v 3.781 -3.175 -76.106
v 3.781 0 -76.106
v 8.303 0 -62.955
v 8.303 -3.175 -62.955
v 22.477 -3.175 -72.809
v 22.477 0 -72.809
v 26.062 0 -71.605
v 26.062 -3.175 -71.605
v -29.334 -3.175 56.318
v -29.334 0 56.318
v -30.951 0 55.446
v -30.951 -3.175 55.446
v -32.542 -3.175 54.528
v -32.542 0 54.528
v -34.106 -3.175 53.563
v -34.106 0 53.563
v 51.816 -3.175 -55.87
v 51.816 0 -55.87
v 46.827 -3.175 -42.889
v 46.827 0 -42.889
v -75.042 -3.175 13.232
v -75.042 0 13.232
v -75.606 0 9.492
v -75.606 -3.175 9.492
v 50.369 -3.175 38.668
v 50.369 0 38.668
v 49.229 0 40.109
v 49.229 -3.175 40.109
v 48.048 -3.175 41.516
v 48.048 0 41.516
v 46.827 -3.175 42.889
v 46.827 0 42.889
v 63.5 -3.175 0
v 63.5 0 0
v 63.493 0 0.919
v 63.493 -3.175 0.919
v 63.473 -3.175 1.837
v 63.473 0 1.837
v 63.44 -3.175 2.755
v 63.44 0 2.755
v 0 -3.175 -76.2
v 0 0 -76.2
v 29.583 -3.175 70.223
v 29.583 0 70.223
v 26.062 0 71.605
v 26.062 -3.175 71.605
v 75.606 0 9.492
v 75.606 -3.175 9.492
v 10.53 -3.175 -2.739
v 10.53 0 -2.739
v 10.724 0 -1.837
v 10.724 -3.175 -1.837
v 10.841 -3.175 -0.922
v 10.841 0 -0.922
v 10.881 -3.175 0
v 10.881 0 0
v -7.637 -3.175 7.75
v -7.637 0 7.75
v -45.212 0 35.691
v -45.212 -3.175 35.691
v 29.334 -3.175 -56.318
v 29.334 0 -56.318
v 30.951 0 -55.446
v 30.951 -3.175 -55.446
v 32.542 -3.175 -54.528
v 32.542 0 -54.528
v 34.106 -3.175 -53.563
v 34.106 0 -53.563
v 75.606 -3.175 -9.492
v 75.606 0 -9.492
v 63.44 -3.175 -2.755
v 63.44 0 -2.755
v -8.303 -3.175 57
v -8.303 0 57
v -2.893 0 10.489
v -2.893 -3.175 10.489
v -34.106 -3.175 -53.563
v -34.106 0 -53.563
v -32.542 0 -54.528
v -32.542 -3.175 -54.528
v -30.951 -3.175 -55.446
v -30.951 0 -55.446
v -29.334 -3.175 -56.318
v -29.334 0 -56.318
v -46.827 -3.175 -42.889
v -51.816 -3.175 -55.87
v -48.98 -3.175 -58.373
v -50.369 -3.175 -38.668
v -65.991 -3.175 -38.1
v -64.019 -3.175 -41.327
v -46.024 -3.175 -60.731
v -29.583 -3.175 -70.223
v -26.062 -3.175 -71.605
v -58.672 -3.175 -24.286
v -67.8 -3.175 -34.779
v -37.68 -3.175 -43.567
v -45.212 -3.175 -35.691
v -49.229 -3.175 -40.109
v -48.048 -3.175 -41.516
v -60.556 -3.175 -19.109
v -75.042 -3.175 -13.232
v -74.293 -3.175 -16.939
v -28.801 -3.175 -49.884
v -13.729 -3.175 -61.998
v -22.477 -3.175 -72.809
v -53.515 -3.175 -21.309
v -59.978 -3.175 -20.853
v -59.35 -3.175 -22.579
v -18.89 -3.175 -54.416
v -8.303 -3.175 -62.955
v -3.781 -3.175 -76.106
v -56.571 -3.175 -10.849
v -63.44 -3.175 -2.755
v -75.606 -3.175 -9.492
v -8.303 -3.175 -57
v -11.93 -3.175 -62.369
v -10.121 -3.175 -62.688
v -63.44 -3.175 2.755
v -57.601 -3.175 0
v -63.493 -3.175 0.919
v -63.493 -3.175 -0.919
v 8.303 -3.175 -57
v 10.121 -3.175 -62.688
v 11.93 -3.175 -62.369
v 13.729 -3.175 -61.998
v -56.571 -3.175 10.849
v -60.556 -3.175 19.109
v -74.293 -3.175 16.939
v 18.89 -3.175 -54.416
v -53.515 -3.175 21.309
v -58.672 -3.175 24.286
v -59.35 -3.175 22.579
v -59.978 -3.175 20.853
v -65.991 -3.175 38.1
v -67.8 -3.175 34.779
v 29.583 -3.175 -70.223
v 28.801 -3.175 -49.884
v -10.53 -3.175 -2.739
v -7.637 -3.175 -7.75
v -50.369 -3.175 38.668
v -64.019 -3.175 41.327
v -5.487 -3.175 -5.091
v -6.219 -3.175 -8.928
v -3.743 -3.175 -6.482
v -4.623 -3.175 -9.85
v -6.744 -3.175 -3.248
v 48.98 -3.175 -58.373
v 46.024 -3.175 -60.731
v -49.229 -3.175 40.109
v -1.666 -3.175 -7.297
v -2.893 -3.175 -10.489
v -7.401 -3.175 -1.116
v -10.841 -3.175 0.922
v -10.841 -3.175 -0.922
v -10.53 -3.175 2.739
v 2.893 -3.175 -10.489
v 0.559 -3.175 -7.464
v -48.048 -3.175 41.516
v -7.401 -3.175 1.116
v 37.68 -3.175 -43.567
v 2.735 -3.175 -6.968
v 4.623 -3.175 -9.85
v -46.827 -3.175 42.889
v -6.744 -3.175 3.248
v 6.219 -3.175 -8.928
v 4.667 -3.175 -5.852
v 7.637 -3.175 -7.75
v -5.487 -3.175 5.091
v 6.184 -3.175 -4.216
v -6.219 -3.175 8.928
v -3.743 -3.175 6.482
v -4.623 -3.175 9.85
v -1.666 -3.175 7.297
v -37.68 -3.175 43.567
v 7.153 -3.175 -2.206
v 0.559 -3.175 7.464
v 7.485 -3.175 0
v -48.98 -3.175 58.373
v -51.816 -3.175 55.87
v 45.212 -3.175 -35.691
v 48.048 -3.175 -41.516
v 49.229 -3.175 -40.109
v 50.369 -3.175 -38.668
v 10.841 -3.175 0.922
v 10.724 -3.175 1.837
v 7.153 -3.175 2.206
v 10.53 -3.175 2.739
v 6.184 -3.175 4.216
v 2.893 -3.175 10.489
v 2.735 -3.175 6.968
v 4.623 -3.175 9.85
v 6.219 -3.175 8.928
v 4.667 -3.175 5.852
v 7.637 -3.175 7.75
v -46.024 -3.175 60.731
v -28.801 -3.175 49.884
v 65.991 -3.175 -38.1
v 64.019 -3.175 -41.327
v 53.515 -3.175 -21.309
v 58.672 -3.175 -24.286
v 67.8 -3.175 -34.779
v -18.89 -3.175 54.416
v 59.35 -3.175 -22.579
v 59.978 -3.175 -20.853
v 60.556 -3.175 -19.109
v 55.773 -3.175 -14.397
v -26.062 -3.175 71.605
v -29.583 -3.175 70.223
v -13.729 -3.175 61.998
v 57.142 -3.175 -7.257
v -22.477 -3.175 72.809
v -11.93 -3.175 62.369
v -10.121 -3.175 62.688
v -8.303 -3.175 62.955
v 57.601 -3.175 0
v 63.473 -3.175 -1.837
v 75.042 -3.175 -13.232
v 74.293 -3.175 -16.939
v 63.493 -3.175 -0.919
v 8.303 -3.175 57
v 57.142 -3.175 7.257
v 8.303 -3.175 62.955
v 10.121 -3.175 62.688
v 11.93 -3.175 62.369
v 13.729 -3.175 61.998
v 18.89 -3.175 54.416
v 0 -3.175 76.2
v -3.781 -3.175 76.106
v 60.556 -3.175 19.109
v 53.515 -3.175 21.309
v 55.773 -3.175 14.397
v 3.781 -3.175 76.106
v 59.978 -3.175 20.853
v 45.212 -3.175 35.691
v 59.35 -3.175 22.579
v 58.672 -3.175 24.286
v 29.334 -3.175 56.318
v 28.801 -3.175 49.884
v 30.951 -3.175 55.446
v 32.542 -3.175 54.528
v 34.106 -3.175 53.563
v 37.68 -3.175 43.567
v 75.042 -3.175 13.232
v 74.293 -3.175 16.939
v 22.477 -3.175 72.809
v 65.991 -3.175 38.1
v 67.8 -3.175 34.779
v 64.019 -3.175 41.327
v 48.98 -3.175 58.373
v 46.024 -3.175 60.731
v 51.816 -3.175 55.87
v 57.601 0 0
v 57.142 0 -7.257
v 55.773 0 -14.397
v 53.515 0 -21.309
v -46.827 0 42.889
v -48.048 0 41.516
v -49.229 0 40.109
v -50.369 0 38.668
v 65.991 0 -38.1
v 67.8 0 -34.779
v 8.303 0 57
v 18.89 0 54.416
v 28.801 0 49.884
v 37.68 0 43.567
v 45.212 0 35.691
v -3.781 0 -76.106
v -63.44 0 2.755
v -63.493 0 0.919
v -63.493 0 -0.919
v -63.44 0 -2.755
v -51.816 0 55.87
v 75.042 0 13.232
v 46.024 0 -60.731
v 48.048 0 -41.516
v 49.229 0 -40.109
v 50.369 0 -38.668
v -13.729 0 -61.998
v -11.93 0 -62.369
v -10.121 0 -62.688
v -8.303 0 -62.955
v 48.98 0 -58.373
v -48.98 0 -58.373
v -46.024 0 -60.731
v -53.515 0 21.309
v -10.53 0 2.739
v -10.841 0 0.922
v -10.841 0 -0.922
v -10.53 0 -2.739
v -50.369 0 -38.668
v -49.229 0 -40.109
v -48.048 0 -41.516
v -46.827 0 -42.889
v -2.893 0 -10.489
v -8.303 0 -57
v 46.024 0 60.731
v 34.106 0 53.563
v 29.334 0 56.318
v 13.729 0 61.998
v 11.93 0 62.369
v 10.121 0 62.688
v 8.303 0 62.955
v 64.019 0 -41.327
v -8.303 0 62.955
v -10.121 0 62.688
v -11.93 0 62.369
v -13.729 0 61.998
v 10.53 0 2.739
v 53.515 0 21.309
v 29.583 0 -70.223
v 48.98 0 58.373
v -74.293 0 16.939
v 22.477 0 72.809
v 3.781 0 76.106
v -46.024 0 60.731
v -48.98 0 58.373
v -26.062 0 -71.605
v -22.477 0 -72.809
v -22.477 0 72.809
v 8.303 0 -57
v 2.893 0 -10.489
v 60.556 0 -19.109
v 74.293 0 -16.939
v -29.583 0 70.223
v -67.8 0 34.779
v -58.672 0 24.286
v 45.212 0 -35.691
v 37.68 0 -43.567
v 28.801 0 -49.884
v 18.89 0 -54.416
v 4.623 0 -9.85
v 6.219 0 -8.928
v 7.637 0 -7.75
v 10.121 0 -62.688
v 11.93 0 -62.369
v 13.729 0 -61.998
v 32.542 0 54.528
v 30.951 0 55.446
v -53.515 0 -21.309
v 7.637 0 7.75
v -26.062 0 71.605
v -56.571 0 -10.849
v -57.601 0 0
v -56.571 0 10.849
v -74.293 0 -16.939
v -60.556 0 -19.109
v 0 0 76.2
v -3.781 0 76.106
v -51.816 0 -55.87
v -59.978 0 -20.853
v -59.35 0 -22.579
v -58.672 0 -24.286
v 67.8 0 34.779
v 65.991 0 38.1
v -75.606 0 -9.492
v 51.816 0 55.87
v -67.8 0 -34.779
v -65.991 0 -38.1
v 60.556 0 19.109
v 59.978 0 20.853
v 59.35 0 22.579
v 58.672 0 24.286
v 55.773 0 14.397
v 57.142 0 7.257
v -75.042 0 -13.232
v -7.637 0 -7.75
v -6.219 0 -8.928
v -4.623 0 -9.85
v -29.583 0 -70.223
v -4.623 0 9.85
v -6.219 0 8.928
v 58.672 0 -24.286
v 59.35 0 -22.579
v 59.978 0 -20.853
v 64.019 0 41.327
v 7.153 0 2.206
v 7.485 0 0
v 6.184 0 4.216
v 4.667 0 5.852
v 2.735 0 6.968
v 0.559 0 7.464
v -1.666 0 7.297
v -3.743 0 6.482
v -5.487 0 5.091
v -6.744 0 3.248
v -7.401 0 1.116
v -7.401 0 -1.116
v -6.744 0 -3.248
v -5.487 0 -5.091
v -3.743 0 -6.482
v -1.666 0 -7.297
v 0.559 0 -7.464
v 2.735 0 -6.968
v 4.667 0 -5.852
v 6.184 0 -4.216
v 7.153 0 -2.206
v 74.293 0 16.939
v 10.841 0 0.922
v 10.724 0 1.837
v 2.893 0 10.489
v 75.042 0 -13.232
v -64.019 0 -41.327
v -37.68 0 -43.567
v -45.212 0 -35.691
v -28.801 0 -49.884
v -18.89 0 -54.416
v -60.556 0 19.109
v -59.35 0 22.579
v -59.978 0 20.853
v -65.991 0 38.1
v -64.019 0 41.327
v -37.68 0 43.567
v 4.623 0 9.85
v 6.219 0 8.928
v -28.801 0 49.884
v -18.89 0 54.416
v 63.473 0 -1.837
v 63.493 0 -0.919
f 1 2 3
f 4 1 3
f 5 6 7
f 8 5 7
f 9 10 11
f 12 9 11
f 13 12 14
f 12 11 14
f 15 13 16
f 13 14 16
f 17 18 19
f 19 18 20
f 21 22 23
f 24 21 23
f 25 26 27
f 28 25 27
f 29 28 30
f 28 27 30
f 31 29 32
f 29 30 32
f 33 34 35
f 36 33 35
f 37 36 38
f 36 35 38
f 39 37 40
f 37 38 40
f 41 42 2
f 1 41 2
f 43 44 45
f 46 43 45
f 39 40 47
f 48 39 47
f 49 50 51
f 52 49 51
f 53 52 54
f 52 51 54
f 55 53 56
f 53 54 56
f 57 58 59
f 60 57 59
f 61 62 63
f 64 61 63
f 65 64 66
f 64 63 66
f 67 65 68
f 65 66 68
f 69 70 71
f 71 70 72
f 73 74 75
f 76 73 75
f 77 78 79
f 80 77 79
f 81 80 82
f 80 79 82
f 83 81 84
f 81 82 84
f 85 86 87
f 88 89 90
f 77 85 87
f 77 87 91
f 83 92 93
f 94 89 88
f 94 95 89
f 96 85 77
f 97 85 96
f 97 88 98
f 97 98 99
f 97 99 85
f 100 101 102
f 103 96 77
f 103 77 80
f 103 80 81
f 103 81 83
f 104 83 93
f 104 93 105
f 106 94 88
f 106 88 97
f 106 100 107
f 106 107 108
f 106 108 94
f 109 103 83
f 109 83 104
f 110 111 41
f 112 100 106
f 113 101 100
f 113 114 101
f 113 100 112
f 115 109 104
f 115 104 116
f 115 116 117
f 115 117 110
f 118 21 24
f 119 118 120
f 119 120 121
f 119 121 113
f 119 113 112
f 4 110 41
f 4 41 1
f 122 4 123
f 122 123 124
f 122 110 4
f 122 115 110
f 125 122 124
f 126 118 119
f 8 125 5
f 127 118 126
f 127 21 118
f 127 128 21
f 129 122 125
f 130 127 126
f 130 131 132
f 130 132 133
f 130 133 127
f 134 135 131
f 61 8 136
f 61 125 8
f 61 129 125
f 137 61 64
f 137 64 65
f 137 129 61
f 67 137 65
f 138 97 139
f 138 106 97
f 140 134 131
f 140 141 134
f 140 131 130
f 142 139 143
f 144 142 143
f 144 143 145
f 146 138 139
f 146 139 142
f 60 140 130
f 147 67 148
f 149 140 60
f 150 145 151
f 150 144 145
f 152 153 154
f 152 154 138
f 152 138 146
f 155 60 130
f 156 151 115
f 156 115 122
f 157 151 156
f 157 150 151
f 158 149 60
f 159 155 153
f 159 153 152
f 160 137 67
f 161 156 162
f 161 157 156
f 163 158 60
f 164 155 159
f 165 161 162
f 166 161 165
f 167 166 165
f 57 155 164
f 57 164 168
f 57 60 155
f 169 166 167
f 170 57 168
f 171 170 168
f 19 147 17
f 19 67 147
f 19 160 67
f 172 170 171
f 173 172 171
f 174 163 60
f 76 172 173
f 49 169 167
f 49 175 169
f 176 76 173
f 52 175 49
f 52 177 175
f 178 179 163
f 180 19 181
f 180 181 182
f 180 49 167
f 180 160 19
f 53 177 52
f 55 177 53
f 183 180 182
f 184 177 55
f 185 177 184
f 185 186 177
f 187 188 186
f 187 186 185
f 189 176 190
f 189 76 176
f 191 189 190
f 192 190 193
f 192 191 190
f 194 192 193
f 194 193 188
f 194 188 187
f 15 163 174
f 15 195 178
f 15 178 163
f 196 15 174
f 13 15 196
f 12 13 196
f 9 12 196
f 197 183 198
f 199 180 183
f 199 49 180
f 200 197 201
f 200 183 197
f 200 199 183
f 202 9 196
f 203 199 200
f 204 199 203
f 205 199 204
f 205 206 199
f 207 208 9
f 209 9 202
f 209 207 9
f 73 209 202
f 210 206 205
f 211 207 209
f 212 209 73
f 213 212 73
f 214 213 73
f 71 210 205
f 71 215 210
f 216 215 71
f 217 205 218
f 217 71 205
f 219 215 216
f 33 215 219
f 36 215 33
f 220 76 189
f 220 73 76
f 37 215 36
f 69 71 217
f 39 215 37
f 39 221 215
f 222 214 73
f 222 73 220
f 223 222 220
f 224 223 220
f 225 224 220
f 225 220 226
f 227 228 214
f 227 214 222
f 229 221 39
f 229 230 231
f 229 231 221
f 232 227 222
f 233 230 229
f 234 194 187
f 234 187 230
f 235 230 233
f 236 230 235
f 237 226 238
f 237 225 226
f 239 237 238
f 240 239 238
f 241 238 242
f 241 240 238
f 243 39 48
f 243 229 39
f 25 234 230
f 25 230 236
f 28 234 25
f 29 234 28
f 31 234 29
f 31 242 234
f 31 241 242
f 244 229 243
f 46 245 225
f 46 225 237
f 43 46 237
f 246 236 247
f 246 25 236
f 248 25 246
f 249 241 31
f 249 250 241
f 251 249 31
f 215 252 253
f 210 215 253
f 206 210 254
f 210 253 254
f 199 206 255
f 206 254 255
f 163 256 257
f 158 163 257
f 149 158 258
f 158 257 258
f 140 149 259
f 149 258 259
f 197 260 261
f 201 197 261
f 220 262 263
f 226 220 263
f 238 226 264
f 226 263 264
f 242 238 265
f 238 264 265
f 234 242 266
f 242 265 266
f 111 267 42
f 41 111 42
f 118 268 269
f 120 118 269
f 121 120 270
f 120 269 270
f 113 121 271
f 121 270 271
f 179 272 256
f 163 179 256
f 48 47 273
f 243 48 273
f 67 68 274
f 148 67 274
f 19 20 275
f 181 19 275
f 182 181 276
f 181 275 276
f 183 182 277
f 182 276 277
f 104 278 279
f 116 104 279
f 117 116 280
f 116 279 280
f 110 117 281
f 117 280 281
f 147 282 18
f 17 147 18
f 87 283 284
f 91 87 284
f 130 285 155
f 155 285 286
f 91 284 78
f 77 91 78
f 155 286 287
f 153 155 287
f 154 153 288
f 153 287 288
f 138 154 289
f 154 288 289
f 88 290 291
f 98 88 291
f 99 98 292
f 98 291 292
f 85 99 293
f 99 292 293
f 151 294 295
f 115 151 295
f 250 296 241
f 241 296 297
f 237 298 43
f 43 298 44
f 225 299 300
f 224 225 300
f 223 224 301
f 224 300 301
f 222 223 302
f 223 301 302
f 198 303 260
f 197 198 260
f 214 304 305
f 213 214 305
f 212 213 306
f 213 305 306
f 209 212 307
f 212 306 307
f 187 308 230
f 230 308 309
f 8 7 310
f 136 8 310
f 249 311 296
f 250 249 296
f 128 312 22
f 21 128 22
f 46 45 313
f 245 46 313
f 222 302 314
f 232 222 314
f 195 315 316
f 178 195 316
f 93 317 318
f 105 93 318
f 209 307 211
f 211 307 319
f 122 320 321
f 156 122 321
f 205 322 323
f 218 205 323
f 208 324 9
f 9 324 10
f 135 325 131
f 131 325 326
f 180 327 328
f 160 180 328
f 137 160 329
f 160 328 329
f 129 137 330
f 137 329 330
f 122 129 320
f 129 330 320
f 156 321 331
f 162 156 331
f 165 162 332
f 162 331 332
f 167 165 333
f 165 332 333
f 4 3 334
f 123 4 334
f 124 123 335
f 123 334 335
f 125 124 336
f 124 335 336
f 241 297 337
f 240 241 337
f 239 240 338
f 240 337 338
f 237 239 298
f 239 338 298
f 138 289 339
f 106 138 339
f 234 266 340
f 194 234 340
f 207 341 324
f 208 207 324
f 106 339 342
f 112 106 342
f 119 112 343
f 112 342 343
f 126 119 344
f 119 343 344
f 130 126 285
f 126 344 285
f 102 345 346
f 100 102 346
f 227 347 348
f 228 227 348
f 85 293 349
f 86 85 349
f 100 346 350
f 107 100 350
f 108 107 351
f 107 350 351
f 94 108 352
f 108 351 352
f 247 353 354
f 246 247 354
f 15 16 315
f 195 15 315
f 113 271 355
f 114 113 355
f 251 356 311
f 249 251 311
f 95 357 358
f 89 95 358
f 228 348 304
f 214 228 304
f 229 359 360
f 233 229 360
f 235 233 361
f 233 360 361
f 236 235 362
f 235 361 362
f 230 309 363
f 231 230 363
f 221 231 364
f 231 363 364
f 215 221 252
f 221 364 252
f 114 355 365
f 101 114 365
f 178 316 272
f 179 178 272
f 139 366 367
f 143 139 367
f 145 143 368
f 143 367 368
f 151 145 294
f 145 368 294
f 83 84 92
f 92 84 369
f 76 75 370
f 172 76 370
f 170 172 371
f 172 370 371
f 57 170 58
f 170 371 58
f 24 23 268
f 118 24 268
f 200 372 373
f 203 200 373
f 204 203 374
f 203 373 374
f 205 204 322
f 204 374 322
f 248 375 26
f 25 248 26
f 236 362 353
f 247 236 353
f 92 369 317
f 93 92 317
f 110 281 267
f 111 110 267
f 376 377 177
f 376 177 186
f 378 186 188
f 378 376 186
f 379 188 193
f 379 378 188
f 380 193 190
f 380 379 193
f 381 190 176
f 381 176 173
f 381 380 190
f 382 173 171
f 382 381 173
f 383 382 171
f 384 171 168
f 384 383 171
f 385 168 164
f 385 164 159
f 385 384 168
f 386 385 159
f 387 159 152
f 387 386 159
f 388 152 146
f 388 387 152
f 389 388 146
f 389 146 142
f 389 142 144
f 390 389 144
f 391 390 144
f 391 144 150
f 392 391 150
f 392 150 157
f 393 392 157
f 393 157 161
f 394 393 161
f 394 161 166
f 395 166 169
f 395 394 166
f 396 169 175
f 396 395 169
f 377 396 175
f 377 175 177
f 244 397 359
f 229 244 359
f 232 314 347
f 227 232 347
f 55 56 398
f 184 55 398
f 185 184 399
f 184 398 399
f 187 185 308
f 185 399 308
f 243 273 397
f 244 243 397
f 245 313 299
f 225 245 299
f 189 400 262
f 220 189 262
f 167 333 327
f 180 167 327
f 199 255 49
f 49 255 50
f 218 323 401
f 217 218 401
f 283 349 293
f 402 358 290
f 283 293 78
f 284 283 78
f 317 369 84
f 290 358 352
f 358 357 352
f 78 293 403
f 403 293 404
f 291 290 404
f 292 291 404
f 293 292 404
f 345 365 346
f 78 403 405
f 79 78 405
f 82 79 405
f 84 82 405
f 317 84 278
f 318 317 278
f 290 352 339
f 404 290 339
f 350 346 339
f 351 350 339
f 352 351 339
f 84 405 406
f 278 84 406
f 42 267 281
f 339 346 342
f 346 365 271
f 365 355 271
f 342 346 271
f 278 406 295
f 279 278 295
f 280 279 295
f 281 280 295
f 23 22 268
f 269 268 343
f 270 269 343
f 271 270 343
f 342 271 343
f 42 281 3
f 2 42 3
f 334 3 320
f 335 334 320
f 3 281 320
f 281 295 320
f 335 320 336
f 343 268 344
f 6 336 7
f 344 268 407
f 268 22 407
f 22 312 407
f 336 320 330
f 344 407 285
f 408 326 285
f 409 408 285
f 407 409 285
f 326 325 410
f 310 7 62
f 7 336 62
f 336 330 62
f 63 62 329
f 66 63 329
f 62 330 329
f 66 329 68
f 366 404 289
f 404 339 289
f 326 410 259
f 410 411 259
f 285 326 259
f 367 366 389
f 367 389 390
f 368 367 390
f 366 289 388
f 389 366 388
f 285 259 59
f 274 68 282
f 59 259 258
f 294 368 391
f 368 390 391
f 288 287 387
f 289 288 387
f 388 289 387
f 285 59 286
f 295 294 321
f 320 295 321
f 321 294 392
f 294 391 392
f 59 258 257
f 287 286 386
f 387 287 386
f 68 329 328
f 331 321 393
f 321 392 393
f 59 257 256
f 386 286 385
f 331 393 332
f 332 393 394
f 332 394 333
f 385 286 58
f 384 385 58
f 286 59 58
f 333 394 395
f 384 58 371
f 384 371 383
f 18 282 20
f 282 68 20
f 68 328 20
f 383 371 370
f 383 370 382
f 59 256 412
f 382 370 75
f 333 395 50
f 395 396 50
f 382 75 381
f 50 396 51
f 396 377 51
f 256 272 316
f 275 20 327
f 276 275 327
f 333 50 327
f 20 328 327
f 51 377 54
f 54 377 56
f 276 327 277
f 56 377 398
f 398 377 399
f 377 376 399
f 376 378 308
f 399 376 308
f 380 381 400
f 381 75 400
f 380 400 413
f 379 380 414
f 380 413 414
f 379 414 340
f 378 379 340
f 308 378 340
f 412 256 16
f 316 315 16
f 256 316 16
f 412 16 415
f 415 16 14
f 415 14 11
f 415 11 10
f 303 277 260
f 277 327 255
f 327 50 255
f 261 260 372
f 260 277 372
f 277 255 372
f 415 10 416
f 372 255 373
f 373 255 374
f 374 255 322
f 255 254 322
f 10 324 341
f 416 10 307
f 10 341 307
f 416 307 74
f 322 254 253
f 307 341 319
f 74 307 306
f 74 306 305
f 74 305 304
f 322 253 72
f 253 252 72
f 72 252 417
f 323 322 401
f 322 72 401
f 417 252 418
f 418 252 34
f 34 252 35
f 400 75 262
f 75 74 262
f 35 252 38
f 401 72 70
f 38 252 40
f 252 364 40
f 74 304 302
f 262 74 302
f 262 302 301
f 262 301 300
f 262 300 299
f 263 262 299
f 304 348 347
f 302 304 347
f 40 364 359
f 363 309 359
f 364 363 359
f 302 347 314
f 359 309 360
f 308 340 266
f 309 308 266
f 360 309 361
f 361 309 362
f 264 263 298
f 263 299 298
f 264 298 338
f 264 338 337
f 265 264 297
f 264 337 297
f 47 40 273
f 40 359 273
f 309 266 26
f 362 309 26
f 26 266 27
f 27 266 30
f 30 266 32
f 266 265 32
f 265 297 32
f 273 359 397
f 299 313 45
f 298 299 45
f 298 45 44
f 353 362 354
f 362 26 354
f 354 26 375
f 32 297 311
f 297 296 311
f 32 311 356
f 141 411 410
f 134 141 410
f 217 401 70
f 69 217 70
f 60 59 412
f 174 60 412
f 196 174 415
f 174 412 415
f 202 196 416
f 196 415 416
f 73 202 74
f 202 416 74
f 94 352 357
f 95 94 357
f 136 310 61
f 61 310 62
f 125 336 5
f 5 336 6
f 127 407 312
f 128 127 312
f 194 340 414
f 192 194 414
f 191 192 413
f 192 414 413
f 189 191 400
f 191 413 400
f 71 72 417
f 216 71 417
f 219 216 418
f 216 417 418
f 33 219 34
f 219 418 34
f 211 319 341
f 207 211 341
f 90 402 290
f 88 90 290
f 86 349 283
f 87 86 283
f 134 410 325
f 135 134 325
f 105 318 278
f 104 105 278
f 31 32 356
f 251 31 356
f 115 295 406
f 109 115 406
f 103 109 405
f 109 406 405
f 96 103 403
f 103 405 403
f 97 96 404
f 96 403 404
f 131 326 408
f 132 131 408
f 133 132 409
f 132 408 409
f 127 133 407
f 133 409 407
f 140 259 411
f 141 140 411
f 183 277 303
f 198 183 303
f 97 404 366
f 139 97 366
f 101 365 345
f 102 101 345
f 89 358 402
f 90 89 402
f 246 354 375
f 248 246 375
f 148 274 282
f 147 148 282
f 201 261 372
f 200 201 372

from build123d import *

# Parameters (mm, degrees)
F0_R     = 7.485066
F1_DEPTH = 3.175


with BuildPart() as f1:
    # F0 (on Front) → F1 (new body)
    with BuildSketch(Plane.XZ):
        with BuildLine():
            ThreePointArc((63.440218, -2.754768), (63.485053, -1.377708), (63.5, 0))
            ThreePointArc((63.5, 0), (63.485053, 1.377708), (63.440218, 2.754768))
            ThreePointArc((63.440218, 2.754768), (62.535292, 11.026659), (60.556491, 19.109197))
            ThreePointArc((60.556491, 19.109197), (59.670481, 21.718279), (58.672119, 24.286468))
            ThreePointArc((58.672119, 24.286468), (54.992613, 31.75), (50.368757, 38.668311))
            ThreePointArc((50.368757, 38.668311), (48.643822, 40.817013), (46.827296, 42.888861))
            ThreePointArc((46.827296, 42.888861), (40.817013, 48.643822), (34.105808, 53.563456))
            ThreePointArc((34.105808, 53.563456), (31.75, 54.992613), (29.33441, 56.318224))
            ThreePointArc((29.33441, 56.318224), (21.718279, 59.670481), (13.729195, 61.998058))
            ThreePointArc((13.729195, 61.998058), (11.026659, 62.535292), (8.303361, 62.954779))
            ThreePointArc((8.303361, 62.954779), (0, 63.5), (-8.303361, 62.954779))
            ThreePointArc((-8.303361, 62.954779), (-11.026659, 62.535292), (-13.729195, 61.998058))
            ThreePointArc((-13.729195, 61.998058), (-21.718279, 59.670481), (-29.33441, 56.318224))
            ThreePointArc((-29.33441, 56.318224), (-31.75, 54.992613), (-34.105808, 53.563456))
            ThreePointArc((-34.105808, 53.563456), (-40.817013, 48.643822), (-46.827296, 42.888861))
            ThreePointArc((-46.827296, 42.888861), (-48.643822, 40.817013), (-50.368757, 38.668311))
            ThreePointArc((-50.368757, 38.668311), (-54.992613, 31.75), (-58.672119, 24.286468))
            ThreePointArc((-58.672119, 24.286468), (-59.670481, 21.718279), (-60.556491, 19.109197))
            ThreePointArc((-60.556491, 19.109197), (-62.535292, 11.026659), (-63.440218, 2.754768))
            ThreePointArc((-63.440218, 2.754768), (-63.5, 0), (-63.440218, -2.754768))
            ThreePointArc((-63.440218, -2.754768), (-62.535292, -11.026659), (-60.556491, -19.109197))
            ThreePointArc((-60.556491, -19.109197), (-59.670481, -21.718279), (-58.672119, -24.286468))
            ThreePointArc((-58.672119, -24.286468), (-54.992613, -31.75), (-50.368757, -38.668311))
            ThreePointArc((-50.368757, -38.668311), (-48.643822, -40.817013), (-46.827296, -42.888861))
            ThreePointArc((-46.827296, -42.888861), (-40.817013, -48.643822), (-34.105808, -53.563456))
            ThreePointArc((-34.105808, -53.563456), (-31.75, -54.992613), (-29.33441, -56.318224))
            ThreePointArc((-29.33441, -56.318224), (-21.718279, -59.670481), (-13.729195, -61.998058))
            ThreePointArc((-13.729195, -61.998058), (-11.026659, -62.535292), (-8.303361, -62.954779))
            ThreePointArc((-8.303361, -62.954779), (0, -63.5), (8.303361, -62.954779))
            ThreePointArc((8.303361, -62.954779), (11.026659, -62.535292), (13.729195, -61.998058))
            ThreePointArc((13.729195, -61.998058), (21.718279, -59.670481), (29.33441, -56.318224))
            ThreePointArc((29.33441, -56.318224), (31.75, -54.992613), (34.105808, -53.563456))
            ThreePointArc((34.105808, -53.563456), (40.817013, -48.643822), (46.827296, -42.888861))
            ThreePointArc((46.827296, -42.888861), (48.643822, -40.817013), (50.368757, -38.668311))
            ThreePointArc((50.368757, -38.668311), (54.992613, -31.75), (58.672119, -24.286468))
            ThreePointArc((58.672119, -24.286468), (59.670481, -21.718279), (60.556491, -19.109197))
            ThreePointArc((60.556491, -19.109197), (62.535292, -11.026659), (63.440218, -2.754768))
        make_face()
        with BuildLine():
            ThreePointArc((45.211563, 35.690804), (49.884258, 28.80069), (53.514925, 21.30896))
            ThreePointArc((53.514925, 21.30896), (56.570542, 10.848628), (57.60138, 0))
            ThreePointArc((57.60138, 0), (56.570542, -10.848628), (53.514925, -21.30896))
            ThreePointArc((53.514925, -21.30896), (49.884258, -28.80069), (45.211563, -35.690804))
            ThreePointArc((45.211563, -35.690804), (28.80069, -49.884258), (8.303361, -56.999765))
            ThreePointArc((8.303361, -56.999765), (0, -57.60138), (-8.303361, -56.999765))
            ThreePointArc((-8.303361, -56.999765), (-28.80069, -49.884258), (-45.211563, -35.690804))
            ThreePointArc((-45.211563, -35.690804), (-49.884258, -28.80069), (-53.514925, -21.30896))
            ThreePointArc((-53.514925, -21.30896), (-57.60138, 0), (-53.514925, 21.30896))
            ThreePointArc((-53.514925, 21.30896), (-49.884258, 28.80069), (-45.211563, 35.690804))
            ThreePointArc((-45.211563, 35.690804), (-28.80069, 49.884258), (-8.303361, 56.999765))
            ThreePointArc((-8.303361, 56.999765), (0, 57.60138), (8.303361, 56.999765))
            ThreePointArc((8.303361, 56.999765), (28.80069, 49.884258), (45.211563, 35.690804))
        make_face(mode=Mode.SUBTRACT)
        with BuildLine():
            ThreePointArc((60.556491, 19.109197), (62.535292, 11.026659), (63.440218, 2.754768))
            Line((63.440218, 2.754768), (75.606443, 9.492404))
            Line((75.606443, 9.492404), (75.042351, 13.231991))
            Line((75.042351, 13.231991), (74.29341, 16.938985))
            Line((74.29341, 16.938985), (60.556491, 19.109197))
        make_face()
        with BuildLine():
            Line((75.606443, -9.492404), (63.440218, -2.754768))
            ThreePointArc((63.440218, -2.754768), (62.535292, -11.026659), (60.556491, -19.109197))
            Line((60.556491, -19.109197), (74.29341, -16.938985))
            Line((74.29341, -16.938985), (75.042351, -13.231991))
            Line((75.042351, -13.231991), (75.606443, -9.492404))
        make_face()
        with BuildLine():
            ThreePointArc((50.368757, 38.668311), (54.992613, 31.75), (58.672119, 24.286468))
            Line((58.672119, 24.286468), (67.800224, 34.778868))
            Line((67.800224, 34.778868), (65.991136, 38.1))
            Line((65.991136, 38.1), (64.019495, 41.327282))
            Line((64.019495, 41.327282), (50.368757, 38.668311))
        make_face()
        with BuildLine():
            Line((67.800224, -34.778868), (58.672119, -24.286468))
            ThreePointArc((58.672119, -24.286468), (54.992613, -31.75), (50.368757, -38.668311))
            Line((50.368757, -38.668311), (64.019495, -41.327282))
            Line((64.019495, -41.327282), (65.991136, -38.1))
            Line((65.991136, -38.1), (67.800224, -34.778868))
        make_face()
        with BuildLine():
            ThreePointArc((34.105808, 53.563456), (40.817013, 48.643822), (46.827296, 42.888861))
            Line((46.827296, 42.888861), (51.816296, 55.870488))
            Line((51.816296, 55.870488), (48.980416, 58.372587))
            Line((48.980416, 58.372587), (46.023884, 60.730899))
            Line((46.023884, 60.730899), (34.105808, 53.563456))
        make_face()
        with BuildLine():
            Line((51.816296, -55.870488), (46.827296, -42.888861))
            ThreePointArc((46.827296, -42.888861), (40.817013, -48.643822), (34.105808, -53.563456))
            Line((34.105808, -53.563456), (46.023884, -60.730899))
            Line((46.023884, -60.730899), (48.980416, -58.372587))
            Line((48.980416, -58.372587), (51.816296, -55.870488))
        make_face()
        with BuildLine():
            ThreePointArc((13.729195, 61.998058), (21.718279, 59.670481), (29.33441, 56.318224))
            Line((29.33441, 56.318224), (29.582559, 70.223302))
            Line((29.582559, 70.223302), (26.061935, 71.604578))
            Line((26.061935, 71.604578), (22.477114, 72.809473))
            Line((22.477114, 72.809473), (13.729195, 61.998058))
        make_face()
        with BuildLine():
            Line((29.582559, -70.223302), (29.33441, -56.318224))
            ThreePointArc((29.33441, -56.318224), (21.718279, -59.670481), (13.729195, -61.998058))
            Line((13.729195, -61.998058), (22.477114, -72.809473))
            Line((22.477114, -72.809473), (26.061935, -71.604578))
            Line((26.061935, -71.604578), (29.582559, -70.223302))
        make_face()
        with BuildLine():
            ThreePointArc((-8.303361, 62.954779), (0, 63.5), (8.303361, 62.954779))
            Line((8.303361, 62.954779), (3.780728, 76.10615))
            Line((3.780728, 76.10615), (0, 76.2))
            Line((0, 76.2), (-3.780728, 76.10615))
            Line((-3.780728, 76.10615), (-8.303361, 62.954779))
        make_face()
        with BuildLine():
            Line((3.780728, -76.10615), (8.303361, -62.954779))
            ThreePointArc((8.303361, -62.954779), (0, -63.5), (-8.303361, -62.954779))
            Line((-8.303361, -62.954779), (-3.780728, -76.10615))
            Line((-3.780728, -76.10615), (0, -76.2))
            Line((0, -76.2), (3.780728, -76.10615))
        make_face()
        with BuildLine():
            ThreePointArc((-29.33441, 56.318224), (-21.718279, 59.670481), (-13.729195, 61.998058))
            Line((-13.729195, 61.998058), (-22.477114, 72.809473))
            Line((-22.477114, 72.809473), (-26.061935, 71.604578))
            Line((-26.061935, 71.604578), (-29.582559, 70.223302))
            Line((-29.582559, 70.223302), (-29.33441, 56.318224))
        make_face()
        with BuildLine():
            Line((-22.477114, -72.809473), (-13.729195, -61.998058))
            ThreePointArc((-13.729195, -61.998058), (-21.718279, -59.670481), (-29.33441, -56.318224))
            Line((-29.33441, -56.318224), (-29.582559, -70.223302))
            Line((-29.582559, -70.223302), (-26.061935, -71.604578))
            Line((-26.061935, -71.604578), (-22.477114, -72.809473))
        make_face()
        with BuildLine():
            ThreePointArc((-46.827296, 42.888861), (-40.817013, 48.643822), (-34.105808, 53.563456))
            Line((-34.105808, 53.563456), (-46.023884, 60.730899))
            Line((-46.023884, 60.730899), (-48.980416, 58.372587))
            Line((-48.980416, 58.372587), (-51.816296, 55.870488))
            Line((-51.816296, 55.870488), (-46.827296, 42.888861))
        make_face()
        with BuildLine():
            Line((-46.023884, -60.730899), (-34.105808, -53.563456))
            ThreePointArc((-34.105808, -53.563456), (-40.817013, -48.643822), (-46.827296, -42.888861))
            Line((-46.827296, -42.888861), (-51.816296, -55.870488))
            Line((-51.816296, -55.870488), (-48.980416, -58.372587))
            Line((-48.980416, -58.372587), (-46.023884, -60.730899))
        make_face()
        with BuildLine():
            ThreePointArc((-58.672119, 24.286468), (-54.992613, 31.75), (-50.368757, 38.668311))
            Line((-50.368757, 38.668311), (-64.019495, 41.327282))
            Line((-64.019495, 41.327282), (-65.991136, 38.1))
            Line((-65.991136, 38.1), (-67.800224, 34.778868))
            Line((-67.800224, 34.778868), (-58.672119, 24.286468))
        make_face()
        with BuildLine():
            Line((-64.019495, -41.327282), (-50.368757, -38.668311))
            ThreePointArc((-50.368757, -38.668311), (-54.992613, -31.75), (-58.672119, -24.286468))
            Line((-58.672119, -24.286468), (-67.800224, -34.778868))
            Line((-67.800224, -34.778868), (-65.991136, -38.1))
            Line((-65.991136, -38.1), (-64.019495, -41.327282))
        make_face()
        with BuildLine():
            ThreePointArc((-63.440218, 2.754768), (-62.535292, 11.026659), (-60.556491, 19.109197))
            Line((-60.556491, 19.109197), (-74.29341, 16.938985))
            Line((-74.29341, 16.938985), (-75.042351, 13.231991))
            Line((-75.042351, 13.231991), (-75.606443, 9.492404))
            Line((-75.606443, 9.492404), (-63.440218, 2.754768))
        make_face()
        with BuildLine():
            Line((-74.29341, -16.938985), (-60.556491, -19.109197))
            ThreePointArc((-60.556491, -19.109197), (-62.535292, -11.026659), (-63.440218, -2.754768))
            Line((-63.440218, -2.754768), (-75.606443, -9.492404))
            Line((-75.606443, -9.492404), (-75.042351, -13.231991))
            Line((-75.042351, -13.231991), (-74.29341, -16.938985))
        make_face()
        with BuildLine():
            ThreePointArc((-2.893492, 10.488725), (0, 10.880516), (2.893492, 10.488725))
            Line((2.893492, 10.488725), (8.303361, 56.999765))
            ThreePointArc((8.303361, 56.999765), (0, 57.60138), (-8.303361, 56.999765))
            Line((-8.303361, 56.999765), (-2.893492, 10.488725))
        make_face()
        with BuildLine():
            ThreePointArc((7.636756, 7.7502), (9.422804, 5.440258), (10.530248, 2.738525))
            Line((10.530248, 2.738525), (53.514925, 21.30896))
            ThreePointArc((53.514925, 21.30896), (49.884258, 28.80069), (45.211563, 35.690804))
            Line((45.211563, 35.690804), (7.636756, 7.7502))
        make_face()
        with BuildLine():
            Line((53.514925, -21.30896), (10.530248, -2.738525))
            ThreePointArc((10.530248, -2.738525), (9.422804, -5.440258), (7.636756, -7.7502))
            Line((7.636756, -7.7502), (45.211563, -35.690804))
            ThreePointArc((45.211563, -35.690804), (49.884258, -28.80069), (53.514925, -21.30896))
        make_face()
        with BuildLine():
            Line((8.303361, -56.999765), (2.893492, -10.488725))
            ThreePointArc((2.893492, -10.488725), (0, -10.880516), (-2.893492, -10.488725))
            Line((-2.893492, -10.488725), (-8.303361, -56.999765))
            ThreePointArc((-8.303361, -56.999765), (0, -57.60138), (8.303361, -56.999765))
        make_face()
        with BuildLine():
            Line((-45.211563, -35.690804), (-7.636756, -7.7502))
            ThreePointArc((-7.636756, -7.7502), (-9.422804, -5.440258), (-10.530248, -2.738525))
            Line((-10.530248, -2.738525), (-53.514925, -21.30896))
            ThreePointArc((-53.514925, -21.30896), (-49.884258, -28.80069), (-45.211563, -35.690804))
        make_face()
        with BuildLine():
            ThreePointArc((-10.530248, 2.738525), (-9.422804, 5.440258), (-7.636756, 7.7502))
            Line((-7.636756, 7.7502), (-45.211563, 35.690804))
            ThreePointArc((-45.211563, 35.690804), (-49.884258, 28.80069), (-53.514925, 21.30896))
            Line((-53.514925, 21.30896), (-10.530248, 2.738525))
        make_face()
        with BuildLine():
            ThreePointArc((10.530248, -2.738525), (10.792594, -1.380417), (10.880516, 0))
            ThreePointArc((10.880516, 0), (10.792594, 1.380417), (10.530248, 2.738525))
            ThreePointArc((10.530248, 2.738525), (9.422804, 5.440258), (7.636756, 7.7502))
            ThreePointArc((7.636756, 7.7502), (5.440258, 9.422804), (2.893492, 10.488725))
            ThreePointArc((2.893492, 10.488725), (0, 10.880516), (-2.893492, 10.488725))
            ThreePointArc((-2.893492, 10.488725), (-5.440258, 9.422804), (-7.636756, 7.7502))
            ThreePointArc((-7.636756, 7.7502), (-9.422804, 5.440258), (-10.530248, 2.738525))
            ThreePointArc((-10.530248, 2.738525), (-10.880516, 0), (-10.530248, -2.738525))
            ThreePointArc((-10.530248, -2.738525), (-9.422804, -5.440258), (-7.636756, -7.7502))
            ThreePointArc((-7.636756, -7.7502), (-5.440258, -9.422804), (-2.893492, -10.488725))
            ThreePointArc((-2.893492, -10.488725), (0, -10.880516), (2.893492, -10.488725))
            ThreePointArc((2.893492, -10.488725), (5.440258, -9.422804), (7.636756, -7.7502))
            ThreePointArc((7.636756, -7.7502), (9.422804, -5.440258), (10.530248, -2.738525))
        make_face()
        Circle(F0_R, mode=Mode.SUBTRACT)
    extrude(amount=F1_DEPTH)


solid = f1.part
